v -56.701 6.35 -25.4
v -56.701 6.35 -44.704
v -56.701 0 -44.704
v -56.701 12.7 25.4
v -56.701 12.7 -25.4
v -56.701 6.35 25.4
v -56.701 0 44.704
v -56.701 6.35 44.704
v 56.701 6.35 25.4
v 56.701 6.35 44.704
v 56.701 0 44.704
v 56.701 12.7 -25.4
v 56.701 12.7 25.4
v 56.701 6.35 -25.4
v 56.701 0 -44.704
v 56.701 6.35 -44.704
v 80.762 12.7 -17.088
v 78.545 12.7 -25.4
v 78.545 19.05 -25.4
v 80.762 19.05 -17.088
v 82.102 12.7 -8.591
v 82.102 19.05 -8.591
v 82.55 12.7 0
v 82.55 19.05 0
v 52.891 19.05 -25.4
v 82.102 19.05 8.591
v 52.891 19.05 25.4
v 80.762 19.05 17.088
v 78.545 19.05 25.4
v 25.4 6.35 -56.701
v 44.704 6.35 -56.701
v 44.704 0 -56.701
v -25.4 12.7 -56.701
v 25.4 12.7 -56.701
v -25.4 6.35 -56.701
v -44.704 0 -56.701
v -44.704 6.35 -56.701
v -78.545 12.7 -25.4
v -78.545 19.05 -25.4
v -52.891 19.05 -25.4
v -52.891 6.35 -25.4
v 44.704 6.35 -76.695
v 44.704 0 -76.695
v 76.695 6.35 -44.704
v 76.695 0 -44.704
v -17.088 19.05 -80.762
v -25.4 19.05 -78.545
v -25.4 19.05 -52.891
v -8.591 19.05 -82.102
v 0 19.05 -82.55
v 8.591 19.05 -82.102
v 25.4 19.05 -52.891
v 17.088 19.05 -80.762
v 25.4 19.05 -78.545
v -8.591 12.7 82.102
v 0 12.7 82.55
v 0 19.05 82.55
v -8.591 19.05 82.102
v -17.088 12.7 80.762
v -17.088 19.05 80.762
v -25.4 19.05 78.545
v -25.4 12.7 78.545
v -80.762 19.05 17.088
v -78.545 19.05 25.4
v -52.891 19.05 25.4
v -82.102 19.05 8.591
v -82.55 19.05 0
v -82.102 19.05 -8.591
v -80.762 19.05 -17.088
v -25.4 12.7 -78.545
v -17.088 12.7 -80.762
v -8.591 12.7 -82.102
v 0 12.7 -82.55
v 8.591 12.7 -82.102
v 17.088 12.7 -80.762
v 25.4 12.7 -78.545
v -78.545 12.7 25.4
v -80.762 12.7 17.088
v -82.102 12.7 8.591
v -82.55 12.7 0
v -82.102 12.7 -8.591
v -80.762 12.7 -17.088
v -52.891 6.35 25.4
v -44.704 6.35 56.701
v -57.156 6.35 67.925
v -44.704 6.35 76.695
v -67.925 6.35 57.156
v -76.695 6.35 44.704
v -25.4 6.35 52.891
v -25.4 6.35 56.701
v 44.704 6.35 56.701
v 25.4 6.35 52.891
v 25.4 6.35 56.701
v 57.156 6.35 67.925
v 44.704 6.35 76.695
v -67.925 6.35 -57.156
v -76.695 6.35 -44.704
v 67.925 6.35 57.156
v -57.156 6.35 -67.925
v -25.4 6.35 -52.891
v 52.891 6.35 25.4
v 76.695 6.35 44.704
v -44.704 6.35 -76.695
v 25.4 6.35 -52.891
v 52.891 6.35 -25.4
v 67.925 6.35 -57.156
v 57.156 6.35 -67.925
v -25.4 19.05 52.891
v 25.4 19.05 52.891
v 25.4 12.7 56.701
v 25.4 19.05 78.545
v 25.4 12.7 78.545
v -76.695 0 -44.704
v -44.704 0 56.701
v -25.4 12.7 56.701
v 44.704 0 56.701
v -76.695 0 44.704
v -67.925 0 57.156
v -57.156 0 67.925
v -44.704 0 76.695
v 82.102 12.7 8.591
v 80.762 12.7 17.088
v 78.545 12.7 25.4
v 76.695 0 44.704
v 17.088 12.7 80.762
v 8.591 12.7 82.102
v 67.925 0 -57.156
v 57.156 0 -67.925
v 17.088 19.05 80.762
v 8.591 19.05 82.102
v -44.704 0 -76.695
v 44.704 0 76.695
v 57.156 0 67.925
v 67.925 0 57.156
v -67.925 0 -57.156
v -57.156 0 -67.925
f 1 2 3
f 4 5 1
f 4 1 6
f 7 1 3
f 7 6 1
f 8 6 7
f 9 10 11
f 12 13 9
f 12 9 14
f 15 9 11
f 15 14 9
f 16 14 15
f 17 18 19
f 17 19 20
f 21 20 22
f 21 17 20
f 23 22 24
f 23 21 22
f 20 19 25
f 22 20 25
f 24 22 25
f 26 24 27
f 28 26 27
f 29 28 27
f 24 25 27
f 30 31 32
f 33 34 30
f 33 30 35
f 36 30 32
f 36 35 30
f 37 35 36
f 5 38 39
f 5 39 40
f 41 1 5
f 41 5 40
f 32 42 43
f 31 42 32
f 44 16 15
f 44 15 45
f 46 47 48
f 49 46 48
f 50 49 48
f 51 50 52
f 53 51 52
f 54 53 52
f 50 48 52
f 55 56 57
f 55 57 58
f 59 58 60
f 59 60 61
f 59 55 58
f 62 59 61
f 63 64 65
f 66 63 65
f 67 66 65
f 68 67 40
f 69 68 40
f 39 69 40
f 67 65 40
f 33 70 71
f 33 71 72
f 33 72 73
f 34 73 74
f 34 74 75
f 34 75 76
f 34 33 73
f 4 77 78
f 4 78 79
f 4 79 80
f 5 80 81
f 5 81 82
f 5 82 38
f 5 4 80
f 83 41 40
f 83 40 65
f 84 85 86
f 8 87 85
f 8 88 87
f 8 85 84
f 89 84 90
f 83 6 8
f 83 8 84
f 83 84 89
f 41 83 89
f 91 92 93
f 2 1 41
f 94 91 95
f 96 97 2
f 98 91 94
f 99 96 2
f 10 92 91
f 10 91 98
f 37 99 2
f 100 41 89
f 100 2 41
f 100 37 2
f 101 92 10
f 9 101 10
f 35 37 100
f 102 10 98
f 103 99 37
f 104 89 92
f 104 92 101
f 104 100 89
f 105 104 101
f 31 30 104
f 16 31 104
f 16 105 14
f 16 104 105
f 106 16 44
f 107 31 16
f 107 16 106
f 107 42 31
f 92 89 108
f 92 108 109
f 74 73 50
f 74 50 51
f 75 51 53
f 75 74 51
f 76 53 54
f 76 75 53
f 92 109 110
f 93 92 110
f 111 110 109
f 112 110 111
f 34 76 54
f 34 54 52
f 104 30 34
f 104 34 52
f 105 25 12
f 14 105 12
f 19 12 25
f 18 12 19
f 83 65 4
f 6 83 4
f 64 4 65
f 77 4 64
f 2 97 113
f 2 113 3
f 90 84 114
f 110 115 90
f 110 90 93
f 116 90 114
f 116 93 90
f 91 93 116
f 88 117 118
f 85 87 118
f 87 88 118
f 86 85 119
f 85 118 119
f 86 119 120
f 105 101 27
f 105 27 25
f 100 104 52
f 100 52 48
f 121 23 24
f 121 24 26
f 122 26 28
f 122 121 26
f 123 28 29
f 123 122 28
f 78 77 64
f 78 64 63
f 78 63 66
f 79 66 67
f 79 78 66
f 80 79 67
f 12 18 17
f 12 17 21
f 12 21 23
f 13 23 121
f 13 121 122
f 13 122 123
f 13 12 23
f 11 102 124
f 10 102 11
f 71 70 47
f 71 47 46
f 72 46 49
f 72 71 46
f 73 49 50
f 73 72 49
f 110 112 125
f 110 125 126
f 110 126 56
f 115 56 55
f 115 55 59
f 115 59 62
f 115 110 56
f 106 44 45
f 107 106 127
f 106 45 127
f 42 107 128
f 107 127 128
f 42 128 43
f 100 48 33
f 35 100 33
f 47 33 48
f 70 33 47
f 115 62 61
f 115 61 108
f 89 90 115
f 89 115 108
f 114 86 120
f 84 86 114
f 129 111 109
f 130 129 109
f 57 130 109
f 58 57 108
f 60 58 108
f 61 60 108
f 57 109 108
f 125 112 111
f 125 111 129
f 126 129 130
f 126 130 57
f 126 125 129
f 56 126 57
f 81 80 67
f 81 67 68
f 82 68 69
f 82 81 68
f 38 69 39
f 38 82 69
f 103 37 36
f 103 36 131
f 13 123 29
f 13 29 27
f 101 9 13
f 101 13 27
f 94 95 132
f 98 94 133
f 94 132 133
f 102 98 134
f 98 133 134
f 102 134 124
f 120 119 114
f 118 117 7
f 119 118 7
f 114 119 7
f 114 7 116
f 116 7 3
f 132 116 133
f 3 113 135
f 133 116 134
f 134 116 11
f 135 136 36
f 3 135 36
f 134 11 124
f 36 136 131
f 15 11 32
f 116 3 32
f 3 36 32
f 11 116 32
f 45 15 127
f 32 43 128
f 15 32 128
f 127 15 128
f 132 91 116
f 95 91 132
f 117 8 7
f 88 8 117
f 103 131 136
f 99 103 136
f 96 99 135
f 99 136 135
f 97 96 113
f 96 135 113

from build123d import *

# Parameters (mm, degrees)
SKETCH1_R         = 88.773
BASE_DEPTH        = 6.35
STOPPER_DEPTH     = 12.7
STOPPER_START     = -6.35
STOPPER_GAP_DEPTH = 13.7
CIRPATTERN1_COUNT = 4


with BuildPart() as part:
    # Sketch1 → Base (new body)
    with BuildSketch(Plane(origin=(0, 0, 0), x_dir=(1, 0, 0), z_dir=(0, 1, 0))):
        Circle(SKETCH1_R)
    extrude(amount=BASE_DEPTH)

    # Sketch2 → Stopper (add)
    with BuildSketch(Plane(origin=(0, 6.35, 0), x_dir=(1, 0, 0), z_dir=(0, 1, 0))):
        with BuildLine():
            Line((-25.4, -78.545162168), (-25.4, -52.891162168))
            Line((-25.4, -52.891162168), (0, -52.891162168))
            Line((0, -52.891162168), (25.4, -52.891162168))
            Line((25.4, -52.891162168), (25.4, -78.545162168))
            ThreePointArc((25.4, -78.545162168), (12.856892374, -81.542644172), (0, -82.55))
            ThreePointArc((0, -82.55), (-12.856892374, -81.542644172), (-25.4, -78.545162168))
        make_face()
    stopper = extrude(amount=STOPPER_DEPTH)

    # Sketch5 → Stopper Gap (cut, through all)
    with BuildSketch(Plane(origin=(0, 19.05, 0), x_dir=(1, 0, 0), z_dir=(0, 1, 0)).offset(STOPPER_START)):
        with BuildLine():
            Line((-44.704, -76.695488218), (-44.704, -56.701162168))
            Line((-44.704, -56.701162168), (0, -56.701162168))
            Line((0, -56.701162168), (44.704, -56.701162168))
            Line((44.704, -56.701162168), (44.704, -76.695488218))
            ThreePointArc((44.704, -76.695488218), (23.153368582, -85.700449545), (0, -88.773))
            ThreePointArc((0, -88.773), (-23.153368582, -85.700449545), (-44.704, -76.695488218))
        make_face()
    stopper_gap = extrude(amount=-STOPPER_GAP_DEPTH, mode=Mode.SUBTRACT)

    # CirPattern1: Stopper, Stopper Gap ×4 about axis
    cirpattern1_axis = Axis((0, 0, 0), (0, 1, 0))
    for i in range(1, CIRPATTERN1_COUNT):
        add(stopper.rotate(cirpattern1_axis, i * 360 / CIRPATTERN1_COUNT))
        add(stopper_gap.rotate(cirpattern1_axis, i * 360 / CIRPATTERN1_COUNT), mode=Mode.SUBTRACT)


solid = part.part
